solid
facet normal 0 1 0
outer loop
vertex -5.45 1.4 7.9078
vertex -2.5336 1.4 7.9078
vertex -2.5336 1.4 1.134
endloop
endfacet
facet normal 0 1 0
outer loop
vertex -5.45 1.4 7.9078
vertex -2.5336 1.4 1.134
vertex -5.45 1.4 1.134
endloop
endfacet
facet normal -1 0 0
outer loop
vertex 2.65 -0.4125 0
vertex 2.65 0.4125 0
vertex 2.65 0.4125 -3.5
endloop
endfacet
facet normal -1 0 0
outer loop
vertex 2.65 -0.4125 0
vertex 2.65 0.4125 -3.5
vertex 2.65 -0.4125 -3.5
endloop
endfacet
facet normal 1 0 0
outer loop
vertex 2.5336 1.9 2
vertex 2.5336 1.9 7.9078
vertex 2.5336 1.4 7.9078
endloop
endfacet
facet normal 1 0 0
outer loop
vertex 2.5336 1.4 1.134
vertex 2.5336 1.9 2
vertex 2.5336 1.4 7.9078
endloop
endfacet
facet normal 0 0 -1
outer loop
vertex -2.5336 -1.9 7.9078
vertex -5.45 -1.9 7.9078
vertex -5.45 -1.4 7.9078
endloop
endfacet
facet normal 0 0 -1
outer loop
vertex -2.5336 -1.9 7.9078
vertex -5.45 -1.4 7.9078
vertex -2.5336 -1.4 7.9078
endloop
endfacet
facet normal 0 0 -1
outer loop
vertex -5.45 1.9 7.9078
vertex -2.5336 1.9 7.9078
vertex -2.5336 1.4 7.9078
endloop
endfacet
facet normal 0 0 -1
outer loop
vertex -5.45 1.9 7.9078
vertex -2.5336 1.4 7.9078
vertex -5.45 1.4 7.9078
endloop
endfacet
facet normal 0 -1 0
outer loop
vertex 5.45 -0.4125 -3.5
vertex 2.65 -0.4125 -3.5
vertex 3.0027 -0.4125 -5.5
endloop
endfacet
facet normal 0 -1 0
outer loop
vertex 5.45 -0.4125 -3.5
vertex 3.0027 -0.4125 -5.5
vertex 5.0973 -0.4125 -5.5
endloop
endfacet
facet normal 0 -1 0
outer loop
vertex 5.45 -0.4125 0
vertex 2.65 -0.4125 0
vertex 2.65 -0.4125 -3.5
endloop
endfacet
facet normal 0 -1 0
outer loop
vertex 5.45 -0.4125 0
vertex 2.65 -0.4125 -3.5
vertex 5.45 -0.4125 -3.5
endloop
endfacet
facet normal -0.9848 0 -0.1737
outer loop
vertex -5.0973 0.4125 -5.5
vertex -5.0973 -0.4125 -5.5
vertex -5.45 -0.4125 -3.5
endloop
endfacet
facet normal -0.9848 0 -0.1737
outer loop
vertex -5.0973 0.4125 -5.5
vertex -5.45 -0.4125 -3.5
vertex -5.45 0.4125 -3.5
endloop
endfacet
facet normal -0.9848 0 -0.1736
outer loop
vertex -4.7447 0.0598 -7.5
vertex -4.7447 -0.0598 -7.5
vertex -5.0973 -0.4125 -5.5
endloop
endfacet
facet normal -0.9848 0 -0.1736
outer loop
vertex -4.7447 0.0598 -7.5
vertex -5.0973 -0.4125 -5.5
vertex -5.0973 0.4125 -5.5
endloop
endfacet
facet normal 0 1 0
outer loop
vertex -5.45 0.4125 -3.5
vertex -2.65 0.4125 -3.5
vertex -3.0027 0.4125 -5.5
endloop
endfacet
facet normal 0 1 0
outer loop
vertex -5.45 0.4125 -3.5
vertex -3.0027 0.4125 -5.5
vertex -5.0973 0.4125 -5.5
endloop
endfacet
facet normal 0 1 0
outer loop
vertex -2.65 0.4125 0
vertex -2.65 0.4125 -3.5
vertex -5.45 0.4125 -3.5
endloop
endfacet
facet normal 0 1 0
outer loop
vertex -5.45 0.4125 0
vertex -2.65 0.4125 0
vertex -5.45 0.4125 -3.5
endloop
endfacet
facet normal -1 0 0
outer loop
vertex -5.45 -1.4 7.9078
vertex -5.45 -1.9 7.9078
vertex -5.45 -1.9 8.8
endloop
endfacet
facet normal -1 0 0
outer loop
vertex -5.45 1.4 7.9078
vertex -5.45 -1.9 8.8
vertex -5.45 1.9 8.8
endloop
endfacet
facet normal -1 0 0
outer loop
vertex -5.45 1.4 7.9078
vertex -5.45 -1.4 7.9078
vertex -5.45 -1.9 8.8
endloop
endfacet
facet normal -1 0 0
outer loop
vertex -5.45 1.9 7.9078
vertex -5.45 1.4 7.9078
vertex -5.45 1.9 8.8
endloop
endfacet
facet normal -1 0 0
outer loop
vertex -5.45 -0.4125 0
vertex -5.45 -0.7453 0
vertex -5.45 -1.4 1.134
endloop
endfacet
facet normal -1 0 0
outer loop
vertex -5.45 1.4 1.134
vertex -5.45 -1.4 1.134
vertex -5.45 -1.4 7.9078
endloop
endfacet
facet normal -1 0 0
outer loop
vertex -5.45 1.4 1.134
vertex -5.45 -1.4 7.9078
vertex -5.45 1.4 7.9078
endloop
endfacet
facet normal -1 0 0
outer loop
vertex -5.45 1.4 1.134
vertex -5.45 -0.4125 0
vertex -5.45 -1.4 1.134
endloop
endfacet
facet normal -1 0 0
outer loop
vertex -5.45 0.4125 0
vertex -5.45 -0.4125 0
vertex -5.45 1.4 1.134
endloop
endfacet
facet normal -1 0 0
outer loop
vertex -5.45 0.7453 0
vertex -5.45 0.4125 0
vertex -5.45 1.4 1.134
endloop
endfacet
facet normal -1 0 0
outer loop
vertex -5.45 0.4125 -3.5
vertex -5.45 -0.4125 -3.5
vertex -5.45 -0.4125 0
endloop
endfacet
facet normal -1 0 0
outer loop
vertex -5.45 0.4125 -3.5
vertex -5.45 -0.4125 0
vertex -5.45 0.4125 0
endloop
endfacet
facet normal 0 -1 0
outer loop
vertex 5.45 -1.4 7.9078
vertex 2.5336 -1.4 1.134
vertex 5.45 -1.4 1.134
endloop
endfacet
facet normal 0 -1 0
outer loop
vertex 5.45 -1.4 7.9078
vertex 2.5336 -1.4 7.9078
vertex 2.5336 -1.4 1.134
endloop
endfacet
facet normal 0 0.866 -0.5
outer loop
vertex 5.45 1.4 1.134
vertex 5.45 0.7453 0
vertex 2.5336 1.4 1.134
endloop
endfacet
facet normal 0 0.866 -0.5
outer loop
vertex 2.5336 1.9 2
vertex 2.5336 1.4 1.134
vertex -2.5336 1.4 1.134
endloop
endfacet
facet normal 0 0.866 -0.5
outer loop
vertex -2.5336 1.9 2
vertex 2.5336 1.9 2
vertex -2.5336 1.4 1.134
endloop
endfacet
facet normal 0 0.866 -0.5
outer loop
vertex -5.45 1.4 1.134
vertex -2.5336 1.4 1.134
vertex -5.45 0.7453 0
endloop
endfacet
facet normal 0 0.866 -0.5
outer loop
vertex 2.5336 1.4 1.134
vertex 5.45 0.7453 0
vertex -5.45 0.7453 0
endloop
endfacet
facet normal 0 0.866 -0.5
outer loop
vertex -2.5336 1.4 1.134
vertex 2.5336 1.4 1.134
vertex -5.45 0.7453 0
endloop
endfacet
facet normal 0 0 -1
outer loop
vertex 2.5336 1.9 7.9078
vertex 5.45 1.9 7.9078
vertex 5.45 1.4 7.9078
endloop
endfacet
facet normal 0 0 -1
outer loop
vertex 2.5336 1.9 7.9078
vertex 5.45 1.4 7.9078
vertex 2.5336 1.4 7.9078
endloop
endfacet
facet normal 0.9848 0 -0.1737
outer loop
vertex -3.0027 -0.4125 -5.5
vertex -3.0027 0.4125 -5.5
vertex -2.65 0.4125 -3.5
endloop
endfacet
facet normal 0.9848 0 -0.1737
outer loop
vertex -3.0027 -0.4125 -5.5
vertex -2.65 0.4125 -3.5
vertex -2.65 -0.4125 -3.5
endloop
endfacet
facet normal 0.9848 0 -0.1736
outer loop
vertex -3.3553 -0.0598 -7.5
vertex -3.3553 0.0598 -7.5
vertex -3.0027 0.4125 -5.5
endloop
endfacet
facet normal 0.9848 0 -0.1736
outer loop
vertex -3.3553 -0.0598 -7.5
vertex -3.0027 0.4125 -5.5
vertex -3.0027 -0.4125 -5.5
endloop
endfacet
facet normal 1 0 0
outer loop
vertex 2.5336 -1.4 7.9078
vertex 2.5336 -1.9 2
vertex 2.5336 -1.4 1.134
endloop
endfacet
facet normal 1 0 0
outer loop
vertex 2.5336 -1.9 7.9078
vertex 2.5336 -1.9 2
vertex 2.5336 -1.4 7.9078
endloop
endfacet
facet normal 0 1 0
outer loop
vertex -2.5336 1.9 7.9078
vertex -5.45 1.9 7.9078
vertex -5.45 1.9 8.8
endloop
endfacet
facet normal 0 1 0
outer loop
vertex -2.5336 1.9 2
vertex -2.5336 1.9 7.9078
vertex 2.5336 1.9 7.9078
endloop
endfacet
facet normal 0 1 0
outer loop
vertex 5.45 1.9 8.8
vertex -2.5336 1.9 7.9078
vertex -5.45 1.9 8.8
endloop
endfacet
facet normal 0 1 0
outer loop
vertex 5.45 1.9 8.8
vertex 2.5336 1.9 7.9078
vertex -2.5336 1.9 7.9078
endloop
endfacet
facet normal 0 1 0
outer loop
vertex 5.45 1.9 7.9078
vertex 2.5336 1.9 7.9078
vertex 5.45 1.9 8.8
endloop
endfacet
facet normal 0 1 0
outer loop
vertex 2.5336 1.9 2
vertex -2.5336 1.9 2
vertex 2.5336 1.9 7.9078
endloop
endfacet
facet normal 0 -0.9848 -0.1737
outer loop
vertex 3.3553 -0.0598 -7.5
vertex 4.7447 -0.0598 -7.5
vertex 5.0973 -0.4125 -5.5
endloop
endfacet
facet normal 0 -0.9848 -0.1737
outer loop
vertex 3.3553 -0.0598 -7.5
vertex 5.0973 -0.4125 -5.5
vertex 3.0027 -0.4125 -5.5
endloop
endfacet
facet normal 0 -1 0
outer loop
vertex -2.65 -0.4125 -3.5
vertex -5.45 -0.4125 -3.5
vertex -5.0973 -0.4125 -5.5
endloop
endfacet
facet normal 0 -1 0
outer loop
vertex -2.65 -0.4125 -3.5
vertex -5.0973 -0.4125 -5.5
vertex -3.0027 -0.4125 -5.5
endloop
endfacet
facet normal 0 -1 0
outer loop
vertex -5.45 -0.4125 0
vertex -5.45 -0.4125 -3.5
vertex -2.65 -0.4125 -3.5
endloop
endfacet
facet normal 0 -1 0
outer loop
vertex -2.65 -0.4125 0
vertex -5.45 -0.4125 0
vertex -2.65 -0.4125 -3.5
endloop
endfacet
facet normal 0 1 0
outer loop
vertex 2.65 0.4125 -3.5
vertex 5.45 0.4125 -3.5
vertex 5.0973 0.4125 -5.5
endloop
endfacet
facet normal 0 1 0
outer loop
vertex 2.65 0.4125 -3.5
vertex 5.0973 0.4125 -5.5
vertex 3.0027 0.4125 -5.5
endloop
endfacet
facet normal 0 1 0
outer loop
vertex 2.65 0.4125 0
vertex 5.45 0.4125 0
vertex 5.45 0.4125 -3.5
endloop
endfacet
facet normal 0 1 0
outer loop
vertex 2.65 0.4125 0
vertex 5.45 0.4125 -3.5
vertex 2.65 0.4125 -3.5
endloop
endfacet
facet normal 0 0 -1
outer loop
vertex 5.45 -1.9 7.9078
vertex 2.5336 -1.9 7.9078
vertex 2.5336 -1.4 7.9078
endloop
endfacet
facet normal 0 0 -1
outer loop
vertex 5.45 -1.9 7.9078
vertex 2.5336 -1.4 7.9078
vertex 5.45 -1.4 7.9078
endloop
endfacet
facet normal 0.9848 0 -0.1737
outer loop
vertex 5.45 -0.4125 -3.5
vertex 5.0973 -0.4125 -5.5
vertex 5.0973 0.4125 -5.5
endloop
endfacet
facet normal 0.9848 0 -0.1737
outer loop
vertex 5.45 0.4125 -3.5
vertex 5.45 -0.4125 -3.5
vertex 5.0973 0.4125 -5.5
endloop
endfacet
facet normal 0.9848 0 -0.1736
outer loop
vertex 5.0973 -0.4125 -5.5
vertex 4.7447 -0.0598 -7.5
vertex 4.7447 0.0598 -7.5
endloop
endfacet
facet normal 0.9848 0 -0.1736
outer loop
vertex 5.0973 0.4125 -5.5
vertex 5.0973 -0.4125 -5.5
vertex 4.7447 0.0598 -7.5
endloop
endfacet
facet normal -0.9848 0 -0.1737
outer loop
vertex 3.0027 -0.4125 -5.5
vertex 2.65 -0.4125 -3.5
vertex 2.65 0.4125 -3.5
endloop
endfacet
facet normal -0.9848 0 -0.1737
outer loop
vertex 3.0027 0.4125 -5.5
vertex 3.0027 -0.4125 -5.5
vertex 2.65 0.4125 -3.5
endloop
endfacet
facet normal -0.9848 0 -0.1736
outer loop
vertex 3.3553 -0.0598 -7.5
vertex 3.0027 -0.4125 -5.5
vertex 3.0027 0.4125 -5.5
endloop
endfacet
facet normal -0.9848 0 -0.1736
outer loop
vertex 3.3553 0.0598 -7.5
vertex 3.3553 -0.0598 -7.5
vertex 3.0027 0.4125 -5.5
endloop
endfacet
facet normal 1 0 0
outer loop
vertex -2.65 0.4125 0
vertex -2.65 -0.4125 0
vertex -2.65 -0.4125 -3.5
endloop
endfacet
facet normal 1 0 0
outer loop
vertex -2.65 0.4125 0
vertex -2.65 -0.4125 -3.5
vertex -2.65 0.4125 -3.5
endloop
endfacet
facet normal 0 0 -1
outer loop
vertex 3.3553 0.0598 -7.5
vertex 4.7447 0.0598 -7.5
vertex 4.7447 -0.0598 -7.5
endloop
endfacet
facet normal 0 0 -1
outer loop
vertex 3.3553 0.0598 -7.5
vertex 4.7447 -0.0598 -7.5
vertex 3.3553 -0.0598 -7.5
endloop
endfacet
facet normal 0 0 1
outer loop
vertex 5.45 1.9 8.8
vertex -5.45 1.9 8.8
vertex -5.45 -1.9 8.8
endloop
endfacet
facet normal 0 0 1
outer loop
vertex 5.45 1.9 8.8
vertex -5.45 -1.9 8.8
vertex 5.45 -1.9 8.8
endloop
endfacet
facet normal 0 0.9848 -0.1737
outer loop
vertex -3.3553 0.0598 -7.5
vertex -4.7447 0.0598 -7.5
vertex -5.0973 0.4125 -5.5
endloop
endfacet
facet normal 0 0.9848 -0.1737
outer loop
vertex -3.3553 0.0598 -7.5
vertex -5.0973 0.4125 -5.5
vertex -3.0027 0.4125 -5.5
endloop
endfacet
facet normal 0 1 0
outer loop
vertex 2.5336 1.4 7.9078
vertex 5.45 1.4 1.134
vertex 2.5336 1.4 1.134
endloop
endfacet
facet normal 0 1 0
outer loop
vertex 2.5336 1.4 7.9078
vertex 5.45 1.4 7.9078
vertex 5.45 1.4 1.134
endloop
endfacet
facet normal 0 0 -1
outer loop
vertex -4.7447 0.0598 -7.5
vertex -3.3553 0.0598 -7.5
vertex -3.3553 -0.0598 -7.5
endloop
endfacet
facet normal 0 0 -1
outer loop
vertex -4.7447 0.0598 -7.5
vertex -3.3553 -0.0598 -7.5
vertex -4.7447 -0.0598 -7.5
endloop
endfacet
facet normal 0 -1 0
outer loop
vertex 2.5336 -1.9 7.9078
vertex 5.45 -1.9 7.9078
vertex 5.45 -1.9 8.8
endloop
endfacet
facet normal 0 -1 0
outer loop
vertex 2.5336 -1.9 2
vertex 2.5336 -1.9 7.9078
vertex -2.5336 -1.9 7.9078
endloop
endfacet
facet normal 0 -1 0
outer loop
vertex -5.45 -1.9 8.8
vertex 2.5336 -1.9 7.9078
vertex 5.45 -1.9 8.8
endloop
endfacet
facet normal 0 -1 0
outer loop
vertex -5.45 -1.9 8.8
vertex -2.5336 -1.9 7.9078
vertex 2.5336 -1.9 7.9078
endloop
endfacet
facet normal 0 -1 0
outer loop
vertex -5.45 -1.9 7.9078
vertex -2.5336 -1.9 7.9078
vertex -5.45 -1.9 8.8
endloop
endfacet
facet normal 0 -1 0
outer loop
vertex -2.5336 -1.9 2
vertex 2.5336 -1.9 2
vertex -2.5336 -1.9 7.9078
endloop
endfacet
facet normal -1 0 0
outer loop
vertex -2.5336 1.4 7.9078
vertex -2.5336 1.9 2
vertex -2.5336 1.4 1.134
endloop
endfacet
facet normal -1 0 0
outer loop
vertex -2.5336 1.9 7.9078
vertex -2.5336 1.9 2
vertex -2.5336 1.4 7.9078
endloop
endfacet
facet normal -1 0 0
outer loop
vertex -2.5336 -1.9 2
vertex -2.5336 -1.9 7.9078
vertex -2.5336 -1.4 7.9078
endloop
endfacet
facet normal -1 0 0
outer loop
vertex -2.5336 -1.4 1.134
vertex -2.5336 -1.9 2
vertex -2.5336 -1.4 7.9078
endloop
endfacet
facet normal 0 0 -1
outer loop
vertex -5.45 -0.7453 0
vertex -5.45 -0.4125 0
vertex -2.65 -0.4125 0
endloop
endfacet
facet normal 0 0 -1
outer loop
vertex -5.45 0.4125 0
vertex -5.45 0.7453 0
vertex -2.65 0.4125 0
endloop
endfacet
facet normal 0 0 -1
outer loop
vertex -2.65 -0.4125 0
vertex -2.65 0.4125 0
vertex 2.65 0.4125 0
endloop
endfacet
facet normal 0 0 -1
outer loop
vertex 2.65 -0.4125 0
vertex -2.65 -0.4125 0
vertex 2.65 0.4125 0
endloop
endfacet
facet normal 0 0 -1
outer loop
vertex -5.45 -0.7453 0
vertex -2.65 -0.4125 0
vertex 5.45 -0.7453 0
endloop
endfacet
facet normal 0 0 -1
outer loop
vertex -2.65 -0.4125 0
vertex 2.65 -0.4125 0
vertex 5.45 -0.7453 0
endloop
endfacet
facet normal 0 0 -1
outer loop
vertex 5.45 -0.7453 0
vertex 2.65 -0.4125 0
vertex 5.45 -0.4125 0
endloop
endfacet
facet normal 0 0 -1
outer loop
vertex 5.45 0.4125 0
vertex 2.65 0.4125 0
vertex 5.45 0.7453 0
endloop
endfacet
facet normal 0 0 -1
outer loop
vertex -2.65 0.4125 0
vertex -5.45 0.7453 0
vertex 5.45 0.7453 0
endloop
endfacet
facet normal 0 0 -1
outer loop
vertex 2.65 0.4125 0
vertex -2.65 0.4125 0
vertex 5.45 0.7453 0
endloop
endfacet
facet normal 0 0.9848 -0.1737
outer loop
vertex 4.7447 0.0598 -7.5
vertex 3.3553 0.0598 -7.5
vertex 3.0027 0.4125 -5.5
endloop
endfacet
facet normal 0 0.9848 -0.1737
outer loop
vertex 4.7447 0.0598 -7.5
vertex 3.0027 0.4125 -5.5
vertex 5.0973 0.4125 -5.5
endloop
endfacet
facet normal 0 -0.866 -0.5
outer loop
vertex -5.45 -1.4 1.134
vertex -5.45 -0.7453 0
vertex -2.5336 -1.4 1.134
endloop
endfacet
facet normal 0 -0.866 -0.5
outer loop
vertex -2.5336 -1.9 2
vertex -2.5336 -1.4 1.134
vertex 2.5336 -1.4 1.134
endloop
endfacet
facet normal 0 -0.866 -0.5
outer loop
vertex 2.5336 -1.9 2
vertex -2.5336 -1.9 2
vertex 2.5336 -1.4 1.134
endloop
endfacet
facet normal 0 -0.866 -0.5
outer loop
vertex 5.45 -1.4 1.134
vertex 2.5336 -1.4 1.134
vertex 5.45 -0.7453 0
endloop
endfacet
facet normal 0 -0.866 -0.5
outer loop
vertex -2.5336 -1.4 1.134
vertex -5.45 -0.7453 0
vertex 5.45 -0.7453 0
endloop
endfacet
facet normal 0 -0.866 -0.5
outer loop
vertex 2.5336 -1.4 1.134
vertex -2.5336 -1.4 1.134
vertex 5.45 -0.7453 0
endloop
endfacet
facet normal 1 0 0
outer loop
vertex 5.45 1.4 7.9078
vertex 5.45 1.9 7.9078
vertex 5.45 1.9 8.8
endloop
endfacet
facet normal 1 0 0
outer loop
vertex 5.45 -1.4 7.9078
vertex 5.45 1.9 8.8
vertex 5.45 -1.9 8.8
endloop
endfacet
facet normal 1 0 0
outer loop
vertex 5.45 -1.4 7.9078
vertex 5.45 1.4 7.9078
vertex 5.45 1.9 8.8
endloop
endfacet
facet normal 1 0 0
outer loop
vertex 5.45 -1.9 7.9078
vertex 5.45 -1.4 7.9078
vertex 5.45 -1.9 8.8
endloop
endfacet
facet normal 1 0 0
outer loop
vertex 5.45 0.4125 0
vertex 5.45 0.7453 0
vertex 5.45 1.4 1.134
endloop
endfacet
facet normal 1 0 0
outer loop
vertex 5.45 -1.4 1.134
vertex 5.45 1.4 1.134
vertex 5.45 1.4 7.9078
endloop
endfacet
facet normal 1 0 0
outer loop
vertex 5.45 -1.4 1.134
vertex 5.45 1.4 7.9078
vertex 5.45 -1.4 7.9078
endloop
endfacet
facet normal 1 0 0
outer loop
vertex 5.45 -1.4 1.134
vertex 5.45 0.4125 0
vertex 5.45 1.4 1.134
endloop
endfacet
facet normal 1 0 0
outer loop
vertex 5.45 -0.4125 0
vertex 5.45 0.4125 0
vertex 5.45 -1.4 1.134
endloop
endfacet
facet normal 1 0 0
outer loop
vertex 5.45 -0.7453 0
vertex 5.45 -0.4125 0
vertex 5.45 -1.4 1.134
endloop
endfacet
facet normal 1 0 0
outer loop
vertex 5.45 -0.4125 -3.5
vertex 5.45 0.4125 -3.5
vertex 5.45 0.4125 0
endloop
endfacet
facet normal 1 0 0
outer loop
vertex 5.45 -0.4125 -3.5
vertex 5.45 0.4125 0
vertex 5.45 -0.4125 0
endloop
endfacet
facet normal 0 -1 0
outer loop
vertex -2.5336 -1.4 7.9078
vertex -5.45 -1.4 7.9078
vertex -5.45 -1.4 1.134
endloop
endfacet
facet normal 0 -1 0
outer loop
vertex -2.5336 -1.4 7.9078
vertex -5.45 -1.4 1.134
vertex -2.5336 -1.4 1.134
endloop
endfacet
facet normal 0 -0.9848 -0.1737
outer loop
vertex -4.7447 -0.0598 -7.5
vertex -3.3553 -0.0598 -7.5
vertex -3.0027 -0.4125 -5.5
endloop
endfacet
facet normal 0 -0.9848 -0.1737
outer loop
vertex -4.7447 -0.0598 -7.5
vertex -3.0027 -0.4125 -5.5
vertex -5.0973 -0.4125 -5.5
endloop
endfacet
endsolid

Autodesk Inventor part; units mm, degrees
ref_plane "YZ Plane" through (0, 0, 0) normal (1, 0, 0) x (0, 1, 0)
ref_plane "XZ Plane" through (0, 0, 0) normal (0, 1, 0) x (-1, 0, 0)
ref_plane "XY Plane" through (0, 0, 0) normal (0, 0, 1) x (1, 0, 0)
sketch "Sketch1" plane through (0, 0, 0) normal (0, 0, 1) x (1, 0, 0)
  line L0 (-5.45, 1.9) -> (5.45, 1.9)
  line L1 (5.45, 1.9) -> (5.45, -1.9)
  line L2 (5.45, -1.9) -> (-5.45, -1.9)
  line L3 (-5.45, -1.9) -> (-5.45, 1.9)
  point P0 (0, 0)
  dimension "d0" = 10.9
  dimension "d1" = 5.45
  dimension "d2" = 3.8
  dimension "d3" = 1.9
extrude "Extrusion1" add sketch "Sketch1" along normal blind 8.8
chamfer "Chamfer1" distance 2 angle 30 1 edges at (0, -1.9, 0) measured on face at (1.8167, -1.9, 2.9333)
chamfer "Chamfer2" distance 2 angle 30 1 edges at (0, 1.9, 0) measured on face at (-1.8167, 1.9, 2.9333)
sketch "Sketch2" plane through (0, 0, 0) normal (0, 0, -1) x (-1, 0, 0)
  line L0 (5.45, -0.4125) -> (2.65, -0.4125)
  line L1 (2.65, -0.4125) -> (2.65, 0.4125)
  line L2 (2.65, 0.4125) -> (5.45, 0.4125)
  line L3 (5.45, 0.4125) -> (5.45, -0.4125)
  line L4 (5.45, -0.7453) -> (5.45, 0.7453) projected
  point P0 (0, 0)
  dimension "d12" = 0
  dimension "d13" = 2.8
  dimension "d14" = 0.825
  dimension "d15" = 0.4125
extrude "Extrusion2" add sketch "Sketch2" along normal blind 7.5
chamfer "Chamfer3" distance 4 angle 10 1 edges at (-5.45, 0, -7.5) measured on face at (-5.45, -0.6333, 4.2667)
chamfer "Chamfer4" distance 4 angle 10 1 edges at (-2.65, 0, -7.5) measured on face at (-2.65, -0.1375, -2.5)
chamfer "Chamfer5" distance 2 angle 10 1 edges at (-4.05, -0.4125, -7.5) measured on face at (-3.8184, -0.4125, -4.8333)
chamfer "Chamfer6" distance 2 angle 10 1 edges at (-4.05, 0.4125, -7.5) measured on face at (-3.8184, 0.4125, -4.8333)
sketch "Sketch3" plane through (-5.45, -1.9, 8.8) normal (0, -1, 0) x (1, 0, 0)
  line L0 (0, -6.8) -> (0, 0) projected
  line L1 (0, -8.8) -> (10.9, -8.8) projected
  line L2 (0, -0.8922) -> (2.9164, -0.8922)
  line L3 (2.9164, -0.8922) -> (2.9164, -8.8)
  line L4 (2.9164, -8.8) -> (0, -8.8)
  line L5 (0, -8.8) -> (0, -0.8922)
  point P0 (5.45, -8.8)
extrude "Extrusion3" cut sketch "Sketch3" against normal blind 0.5
mirror "Mirror1" about plane through (0, 0, 0) normal (0, 1, 0) of "Extrusion3"
mirror "Mirror2" about plane through (0, 0, 0) normal (1, 0, 0) of "Extrusion3", "Mirror1"
mirror "Mirror3" about plane through (0, 0, 0) normal (1, 0, 0) of "Extrusion2"
chamfer "Chamfer7" distance 4 angle 10 1 edges at (2.65, 0, -7.5) measured on face at (2.65, -0.1375, -2.5)
chamfer "Chamfer8" distance 4 angle 10 1 edges at (5.45, 0, -7.5) measured on face at (5.45, 0.4667, 3.3919)
chamfer "Chamfer9" distance 2 angle 10 1 edges at (4.05, 0.4125, -7.5) measured on face at (3.8184, 0.4125, -4.8333)
chamfer "Chamfer10" distance 2 angle 10 1 edges at (4.05, -0.4125, -7.5) measured on face at (3.8184, -0.4125, -4.8333)
properties part number "Mini-ATC_FUse"
